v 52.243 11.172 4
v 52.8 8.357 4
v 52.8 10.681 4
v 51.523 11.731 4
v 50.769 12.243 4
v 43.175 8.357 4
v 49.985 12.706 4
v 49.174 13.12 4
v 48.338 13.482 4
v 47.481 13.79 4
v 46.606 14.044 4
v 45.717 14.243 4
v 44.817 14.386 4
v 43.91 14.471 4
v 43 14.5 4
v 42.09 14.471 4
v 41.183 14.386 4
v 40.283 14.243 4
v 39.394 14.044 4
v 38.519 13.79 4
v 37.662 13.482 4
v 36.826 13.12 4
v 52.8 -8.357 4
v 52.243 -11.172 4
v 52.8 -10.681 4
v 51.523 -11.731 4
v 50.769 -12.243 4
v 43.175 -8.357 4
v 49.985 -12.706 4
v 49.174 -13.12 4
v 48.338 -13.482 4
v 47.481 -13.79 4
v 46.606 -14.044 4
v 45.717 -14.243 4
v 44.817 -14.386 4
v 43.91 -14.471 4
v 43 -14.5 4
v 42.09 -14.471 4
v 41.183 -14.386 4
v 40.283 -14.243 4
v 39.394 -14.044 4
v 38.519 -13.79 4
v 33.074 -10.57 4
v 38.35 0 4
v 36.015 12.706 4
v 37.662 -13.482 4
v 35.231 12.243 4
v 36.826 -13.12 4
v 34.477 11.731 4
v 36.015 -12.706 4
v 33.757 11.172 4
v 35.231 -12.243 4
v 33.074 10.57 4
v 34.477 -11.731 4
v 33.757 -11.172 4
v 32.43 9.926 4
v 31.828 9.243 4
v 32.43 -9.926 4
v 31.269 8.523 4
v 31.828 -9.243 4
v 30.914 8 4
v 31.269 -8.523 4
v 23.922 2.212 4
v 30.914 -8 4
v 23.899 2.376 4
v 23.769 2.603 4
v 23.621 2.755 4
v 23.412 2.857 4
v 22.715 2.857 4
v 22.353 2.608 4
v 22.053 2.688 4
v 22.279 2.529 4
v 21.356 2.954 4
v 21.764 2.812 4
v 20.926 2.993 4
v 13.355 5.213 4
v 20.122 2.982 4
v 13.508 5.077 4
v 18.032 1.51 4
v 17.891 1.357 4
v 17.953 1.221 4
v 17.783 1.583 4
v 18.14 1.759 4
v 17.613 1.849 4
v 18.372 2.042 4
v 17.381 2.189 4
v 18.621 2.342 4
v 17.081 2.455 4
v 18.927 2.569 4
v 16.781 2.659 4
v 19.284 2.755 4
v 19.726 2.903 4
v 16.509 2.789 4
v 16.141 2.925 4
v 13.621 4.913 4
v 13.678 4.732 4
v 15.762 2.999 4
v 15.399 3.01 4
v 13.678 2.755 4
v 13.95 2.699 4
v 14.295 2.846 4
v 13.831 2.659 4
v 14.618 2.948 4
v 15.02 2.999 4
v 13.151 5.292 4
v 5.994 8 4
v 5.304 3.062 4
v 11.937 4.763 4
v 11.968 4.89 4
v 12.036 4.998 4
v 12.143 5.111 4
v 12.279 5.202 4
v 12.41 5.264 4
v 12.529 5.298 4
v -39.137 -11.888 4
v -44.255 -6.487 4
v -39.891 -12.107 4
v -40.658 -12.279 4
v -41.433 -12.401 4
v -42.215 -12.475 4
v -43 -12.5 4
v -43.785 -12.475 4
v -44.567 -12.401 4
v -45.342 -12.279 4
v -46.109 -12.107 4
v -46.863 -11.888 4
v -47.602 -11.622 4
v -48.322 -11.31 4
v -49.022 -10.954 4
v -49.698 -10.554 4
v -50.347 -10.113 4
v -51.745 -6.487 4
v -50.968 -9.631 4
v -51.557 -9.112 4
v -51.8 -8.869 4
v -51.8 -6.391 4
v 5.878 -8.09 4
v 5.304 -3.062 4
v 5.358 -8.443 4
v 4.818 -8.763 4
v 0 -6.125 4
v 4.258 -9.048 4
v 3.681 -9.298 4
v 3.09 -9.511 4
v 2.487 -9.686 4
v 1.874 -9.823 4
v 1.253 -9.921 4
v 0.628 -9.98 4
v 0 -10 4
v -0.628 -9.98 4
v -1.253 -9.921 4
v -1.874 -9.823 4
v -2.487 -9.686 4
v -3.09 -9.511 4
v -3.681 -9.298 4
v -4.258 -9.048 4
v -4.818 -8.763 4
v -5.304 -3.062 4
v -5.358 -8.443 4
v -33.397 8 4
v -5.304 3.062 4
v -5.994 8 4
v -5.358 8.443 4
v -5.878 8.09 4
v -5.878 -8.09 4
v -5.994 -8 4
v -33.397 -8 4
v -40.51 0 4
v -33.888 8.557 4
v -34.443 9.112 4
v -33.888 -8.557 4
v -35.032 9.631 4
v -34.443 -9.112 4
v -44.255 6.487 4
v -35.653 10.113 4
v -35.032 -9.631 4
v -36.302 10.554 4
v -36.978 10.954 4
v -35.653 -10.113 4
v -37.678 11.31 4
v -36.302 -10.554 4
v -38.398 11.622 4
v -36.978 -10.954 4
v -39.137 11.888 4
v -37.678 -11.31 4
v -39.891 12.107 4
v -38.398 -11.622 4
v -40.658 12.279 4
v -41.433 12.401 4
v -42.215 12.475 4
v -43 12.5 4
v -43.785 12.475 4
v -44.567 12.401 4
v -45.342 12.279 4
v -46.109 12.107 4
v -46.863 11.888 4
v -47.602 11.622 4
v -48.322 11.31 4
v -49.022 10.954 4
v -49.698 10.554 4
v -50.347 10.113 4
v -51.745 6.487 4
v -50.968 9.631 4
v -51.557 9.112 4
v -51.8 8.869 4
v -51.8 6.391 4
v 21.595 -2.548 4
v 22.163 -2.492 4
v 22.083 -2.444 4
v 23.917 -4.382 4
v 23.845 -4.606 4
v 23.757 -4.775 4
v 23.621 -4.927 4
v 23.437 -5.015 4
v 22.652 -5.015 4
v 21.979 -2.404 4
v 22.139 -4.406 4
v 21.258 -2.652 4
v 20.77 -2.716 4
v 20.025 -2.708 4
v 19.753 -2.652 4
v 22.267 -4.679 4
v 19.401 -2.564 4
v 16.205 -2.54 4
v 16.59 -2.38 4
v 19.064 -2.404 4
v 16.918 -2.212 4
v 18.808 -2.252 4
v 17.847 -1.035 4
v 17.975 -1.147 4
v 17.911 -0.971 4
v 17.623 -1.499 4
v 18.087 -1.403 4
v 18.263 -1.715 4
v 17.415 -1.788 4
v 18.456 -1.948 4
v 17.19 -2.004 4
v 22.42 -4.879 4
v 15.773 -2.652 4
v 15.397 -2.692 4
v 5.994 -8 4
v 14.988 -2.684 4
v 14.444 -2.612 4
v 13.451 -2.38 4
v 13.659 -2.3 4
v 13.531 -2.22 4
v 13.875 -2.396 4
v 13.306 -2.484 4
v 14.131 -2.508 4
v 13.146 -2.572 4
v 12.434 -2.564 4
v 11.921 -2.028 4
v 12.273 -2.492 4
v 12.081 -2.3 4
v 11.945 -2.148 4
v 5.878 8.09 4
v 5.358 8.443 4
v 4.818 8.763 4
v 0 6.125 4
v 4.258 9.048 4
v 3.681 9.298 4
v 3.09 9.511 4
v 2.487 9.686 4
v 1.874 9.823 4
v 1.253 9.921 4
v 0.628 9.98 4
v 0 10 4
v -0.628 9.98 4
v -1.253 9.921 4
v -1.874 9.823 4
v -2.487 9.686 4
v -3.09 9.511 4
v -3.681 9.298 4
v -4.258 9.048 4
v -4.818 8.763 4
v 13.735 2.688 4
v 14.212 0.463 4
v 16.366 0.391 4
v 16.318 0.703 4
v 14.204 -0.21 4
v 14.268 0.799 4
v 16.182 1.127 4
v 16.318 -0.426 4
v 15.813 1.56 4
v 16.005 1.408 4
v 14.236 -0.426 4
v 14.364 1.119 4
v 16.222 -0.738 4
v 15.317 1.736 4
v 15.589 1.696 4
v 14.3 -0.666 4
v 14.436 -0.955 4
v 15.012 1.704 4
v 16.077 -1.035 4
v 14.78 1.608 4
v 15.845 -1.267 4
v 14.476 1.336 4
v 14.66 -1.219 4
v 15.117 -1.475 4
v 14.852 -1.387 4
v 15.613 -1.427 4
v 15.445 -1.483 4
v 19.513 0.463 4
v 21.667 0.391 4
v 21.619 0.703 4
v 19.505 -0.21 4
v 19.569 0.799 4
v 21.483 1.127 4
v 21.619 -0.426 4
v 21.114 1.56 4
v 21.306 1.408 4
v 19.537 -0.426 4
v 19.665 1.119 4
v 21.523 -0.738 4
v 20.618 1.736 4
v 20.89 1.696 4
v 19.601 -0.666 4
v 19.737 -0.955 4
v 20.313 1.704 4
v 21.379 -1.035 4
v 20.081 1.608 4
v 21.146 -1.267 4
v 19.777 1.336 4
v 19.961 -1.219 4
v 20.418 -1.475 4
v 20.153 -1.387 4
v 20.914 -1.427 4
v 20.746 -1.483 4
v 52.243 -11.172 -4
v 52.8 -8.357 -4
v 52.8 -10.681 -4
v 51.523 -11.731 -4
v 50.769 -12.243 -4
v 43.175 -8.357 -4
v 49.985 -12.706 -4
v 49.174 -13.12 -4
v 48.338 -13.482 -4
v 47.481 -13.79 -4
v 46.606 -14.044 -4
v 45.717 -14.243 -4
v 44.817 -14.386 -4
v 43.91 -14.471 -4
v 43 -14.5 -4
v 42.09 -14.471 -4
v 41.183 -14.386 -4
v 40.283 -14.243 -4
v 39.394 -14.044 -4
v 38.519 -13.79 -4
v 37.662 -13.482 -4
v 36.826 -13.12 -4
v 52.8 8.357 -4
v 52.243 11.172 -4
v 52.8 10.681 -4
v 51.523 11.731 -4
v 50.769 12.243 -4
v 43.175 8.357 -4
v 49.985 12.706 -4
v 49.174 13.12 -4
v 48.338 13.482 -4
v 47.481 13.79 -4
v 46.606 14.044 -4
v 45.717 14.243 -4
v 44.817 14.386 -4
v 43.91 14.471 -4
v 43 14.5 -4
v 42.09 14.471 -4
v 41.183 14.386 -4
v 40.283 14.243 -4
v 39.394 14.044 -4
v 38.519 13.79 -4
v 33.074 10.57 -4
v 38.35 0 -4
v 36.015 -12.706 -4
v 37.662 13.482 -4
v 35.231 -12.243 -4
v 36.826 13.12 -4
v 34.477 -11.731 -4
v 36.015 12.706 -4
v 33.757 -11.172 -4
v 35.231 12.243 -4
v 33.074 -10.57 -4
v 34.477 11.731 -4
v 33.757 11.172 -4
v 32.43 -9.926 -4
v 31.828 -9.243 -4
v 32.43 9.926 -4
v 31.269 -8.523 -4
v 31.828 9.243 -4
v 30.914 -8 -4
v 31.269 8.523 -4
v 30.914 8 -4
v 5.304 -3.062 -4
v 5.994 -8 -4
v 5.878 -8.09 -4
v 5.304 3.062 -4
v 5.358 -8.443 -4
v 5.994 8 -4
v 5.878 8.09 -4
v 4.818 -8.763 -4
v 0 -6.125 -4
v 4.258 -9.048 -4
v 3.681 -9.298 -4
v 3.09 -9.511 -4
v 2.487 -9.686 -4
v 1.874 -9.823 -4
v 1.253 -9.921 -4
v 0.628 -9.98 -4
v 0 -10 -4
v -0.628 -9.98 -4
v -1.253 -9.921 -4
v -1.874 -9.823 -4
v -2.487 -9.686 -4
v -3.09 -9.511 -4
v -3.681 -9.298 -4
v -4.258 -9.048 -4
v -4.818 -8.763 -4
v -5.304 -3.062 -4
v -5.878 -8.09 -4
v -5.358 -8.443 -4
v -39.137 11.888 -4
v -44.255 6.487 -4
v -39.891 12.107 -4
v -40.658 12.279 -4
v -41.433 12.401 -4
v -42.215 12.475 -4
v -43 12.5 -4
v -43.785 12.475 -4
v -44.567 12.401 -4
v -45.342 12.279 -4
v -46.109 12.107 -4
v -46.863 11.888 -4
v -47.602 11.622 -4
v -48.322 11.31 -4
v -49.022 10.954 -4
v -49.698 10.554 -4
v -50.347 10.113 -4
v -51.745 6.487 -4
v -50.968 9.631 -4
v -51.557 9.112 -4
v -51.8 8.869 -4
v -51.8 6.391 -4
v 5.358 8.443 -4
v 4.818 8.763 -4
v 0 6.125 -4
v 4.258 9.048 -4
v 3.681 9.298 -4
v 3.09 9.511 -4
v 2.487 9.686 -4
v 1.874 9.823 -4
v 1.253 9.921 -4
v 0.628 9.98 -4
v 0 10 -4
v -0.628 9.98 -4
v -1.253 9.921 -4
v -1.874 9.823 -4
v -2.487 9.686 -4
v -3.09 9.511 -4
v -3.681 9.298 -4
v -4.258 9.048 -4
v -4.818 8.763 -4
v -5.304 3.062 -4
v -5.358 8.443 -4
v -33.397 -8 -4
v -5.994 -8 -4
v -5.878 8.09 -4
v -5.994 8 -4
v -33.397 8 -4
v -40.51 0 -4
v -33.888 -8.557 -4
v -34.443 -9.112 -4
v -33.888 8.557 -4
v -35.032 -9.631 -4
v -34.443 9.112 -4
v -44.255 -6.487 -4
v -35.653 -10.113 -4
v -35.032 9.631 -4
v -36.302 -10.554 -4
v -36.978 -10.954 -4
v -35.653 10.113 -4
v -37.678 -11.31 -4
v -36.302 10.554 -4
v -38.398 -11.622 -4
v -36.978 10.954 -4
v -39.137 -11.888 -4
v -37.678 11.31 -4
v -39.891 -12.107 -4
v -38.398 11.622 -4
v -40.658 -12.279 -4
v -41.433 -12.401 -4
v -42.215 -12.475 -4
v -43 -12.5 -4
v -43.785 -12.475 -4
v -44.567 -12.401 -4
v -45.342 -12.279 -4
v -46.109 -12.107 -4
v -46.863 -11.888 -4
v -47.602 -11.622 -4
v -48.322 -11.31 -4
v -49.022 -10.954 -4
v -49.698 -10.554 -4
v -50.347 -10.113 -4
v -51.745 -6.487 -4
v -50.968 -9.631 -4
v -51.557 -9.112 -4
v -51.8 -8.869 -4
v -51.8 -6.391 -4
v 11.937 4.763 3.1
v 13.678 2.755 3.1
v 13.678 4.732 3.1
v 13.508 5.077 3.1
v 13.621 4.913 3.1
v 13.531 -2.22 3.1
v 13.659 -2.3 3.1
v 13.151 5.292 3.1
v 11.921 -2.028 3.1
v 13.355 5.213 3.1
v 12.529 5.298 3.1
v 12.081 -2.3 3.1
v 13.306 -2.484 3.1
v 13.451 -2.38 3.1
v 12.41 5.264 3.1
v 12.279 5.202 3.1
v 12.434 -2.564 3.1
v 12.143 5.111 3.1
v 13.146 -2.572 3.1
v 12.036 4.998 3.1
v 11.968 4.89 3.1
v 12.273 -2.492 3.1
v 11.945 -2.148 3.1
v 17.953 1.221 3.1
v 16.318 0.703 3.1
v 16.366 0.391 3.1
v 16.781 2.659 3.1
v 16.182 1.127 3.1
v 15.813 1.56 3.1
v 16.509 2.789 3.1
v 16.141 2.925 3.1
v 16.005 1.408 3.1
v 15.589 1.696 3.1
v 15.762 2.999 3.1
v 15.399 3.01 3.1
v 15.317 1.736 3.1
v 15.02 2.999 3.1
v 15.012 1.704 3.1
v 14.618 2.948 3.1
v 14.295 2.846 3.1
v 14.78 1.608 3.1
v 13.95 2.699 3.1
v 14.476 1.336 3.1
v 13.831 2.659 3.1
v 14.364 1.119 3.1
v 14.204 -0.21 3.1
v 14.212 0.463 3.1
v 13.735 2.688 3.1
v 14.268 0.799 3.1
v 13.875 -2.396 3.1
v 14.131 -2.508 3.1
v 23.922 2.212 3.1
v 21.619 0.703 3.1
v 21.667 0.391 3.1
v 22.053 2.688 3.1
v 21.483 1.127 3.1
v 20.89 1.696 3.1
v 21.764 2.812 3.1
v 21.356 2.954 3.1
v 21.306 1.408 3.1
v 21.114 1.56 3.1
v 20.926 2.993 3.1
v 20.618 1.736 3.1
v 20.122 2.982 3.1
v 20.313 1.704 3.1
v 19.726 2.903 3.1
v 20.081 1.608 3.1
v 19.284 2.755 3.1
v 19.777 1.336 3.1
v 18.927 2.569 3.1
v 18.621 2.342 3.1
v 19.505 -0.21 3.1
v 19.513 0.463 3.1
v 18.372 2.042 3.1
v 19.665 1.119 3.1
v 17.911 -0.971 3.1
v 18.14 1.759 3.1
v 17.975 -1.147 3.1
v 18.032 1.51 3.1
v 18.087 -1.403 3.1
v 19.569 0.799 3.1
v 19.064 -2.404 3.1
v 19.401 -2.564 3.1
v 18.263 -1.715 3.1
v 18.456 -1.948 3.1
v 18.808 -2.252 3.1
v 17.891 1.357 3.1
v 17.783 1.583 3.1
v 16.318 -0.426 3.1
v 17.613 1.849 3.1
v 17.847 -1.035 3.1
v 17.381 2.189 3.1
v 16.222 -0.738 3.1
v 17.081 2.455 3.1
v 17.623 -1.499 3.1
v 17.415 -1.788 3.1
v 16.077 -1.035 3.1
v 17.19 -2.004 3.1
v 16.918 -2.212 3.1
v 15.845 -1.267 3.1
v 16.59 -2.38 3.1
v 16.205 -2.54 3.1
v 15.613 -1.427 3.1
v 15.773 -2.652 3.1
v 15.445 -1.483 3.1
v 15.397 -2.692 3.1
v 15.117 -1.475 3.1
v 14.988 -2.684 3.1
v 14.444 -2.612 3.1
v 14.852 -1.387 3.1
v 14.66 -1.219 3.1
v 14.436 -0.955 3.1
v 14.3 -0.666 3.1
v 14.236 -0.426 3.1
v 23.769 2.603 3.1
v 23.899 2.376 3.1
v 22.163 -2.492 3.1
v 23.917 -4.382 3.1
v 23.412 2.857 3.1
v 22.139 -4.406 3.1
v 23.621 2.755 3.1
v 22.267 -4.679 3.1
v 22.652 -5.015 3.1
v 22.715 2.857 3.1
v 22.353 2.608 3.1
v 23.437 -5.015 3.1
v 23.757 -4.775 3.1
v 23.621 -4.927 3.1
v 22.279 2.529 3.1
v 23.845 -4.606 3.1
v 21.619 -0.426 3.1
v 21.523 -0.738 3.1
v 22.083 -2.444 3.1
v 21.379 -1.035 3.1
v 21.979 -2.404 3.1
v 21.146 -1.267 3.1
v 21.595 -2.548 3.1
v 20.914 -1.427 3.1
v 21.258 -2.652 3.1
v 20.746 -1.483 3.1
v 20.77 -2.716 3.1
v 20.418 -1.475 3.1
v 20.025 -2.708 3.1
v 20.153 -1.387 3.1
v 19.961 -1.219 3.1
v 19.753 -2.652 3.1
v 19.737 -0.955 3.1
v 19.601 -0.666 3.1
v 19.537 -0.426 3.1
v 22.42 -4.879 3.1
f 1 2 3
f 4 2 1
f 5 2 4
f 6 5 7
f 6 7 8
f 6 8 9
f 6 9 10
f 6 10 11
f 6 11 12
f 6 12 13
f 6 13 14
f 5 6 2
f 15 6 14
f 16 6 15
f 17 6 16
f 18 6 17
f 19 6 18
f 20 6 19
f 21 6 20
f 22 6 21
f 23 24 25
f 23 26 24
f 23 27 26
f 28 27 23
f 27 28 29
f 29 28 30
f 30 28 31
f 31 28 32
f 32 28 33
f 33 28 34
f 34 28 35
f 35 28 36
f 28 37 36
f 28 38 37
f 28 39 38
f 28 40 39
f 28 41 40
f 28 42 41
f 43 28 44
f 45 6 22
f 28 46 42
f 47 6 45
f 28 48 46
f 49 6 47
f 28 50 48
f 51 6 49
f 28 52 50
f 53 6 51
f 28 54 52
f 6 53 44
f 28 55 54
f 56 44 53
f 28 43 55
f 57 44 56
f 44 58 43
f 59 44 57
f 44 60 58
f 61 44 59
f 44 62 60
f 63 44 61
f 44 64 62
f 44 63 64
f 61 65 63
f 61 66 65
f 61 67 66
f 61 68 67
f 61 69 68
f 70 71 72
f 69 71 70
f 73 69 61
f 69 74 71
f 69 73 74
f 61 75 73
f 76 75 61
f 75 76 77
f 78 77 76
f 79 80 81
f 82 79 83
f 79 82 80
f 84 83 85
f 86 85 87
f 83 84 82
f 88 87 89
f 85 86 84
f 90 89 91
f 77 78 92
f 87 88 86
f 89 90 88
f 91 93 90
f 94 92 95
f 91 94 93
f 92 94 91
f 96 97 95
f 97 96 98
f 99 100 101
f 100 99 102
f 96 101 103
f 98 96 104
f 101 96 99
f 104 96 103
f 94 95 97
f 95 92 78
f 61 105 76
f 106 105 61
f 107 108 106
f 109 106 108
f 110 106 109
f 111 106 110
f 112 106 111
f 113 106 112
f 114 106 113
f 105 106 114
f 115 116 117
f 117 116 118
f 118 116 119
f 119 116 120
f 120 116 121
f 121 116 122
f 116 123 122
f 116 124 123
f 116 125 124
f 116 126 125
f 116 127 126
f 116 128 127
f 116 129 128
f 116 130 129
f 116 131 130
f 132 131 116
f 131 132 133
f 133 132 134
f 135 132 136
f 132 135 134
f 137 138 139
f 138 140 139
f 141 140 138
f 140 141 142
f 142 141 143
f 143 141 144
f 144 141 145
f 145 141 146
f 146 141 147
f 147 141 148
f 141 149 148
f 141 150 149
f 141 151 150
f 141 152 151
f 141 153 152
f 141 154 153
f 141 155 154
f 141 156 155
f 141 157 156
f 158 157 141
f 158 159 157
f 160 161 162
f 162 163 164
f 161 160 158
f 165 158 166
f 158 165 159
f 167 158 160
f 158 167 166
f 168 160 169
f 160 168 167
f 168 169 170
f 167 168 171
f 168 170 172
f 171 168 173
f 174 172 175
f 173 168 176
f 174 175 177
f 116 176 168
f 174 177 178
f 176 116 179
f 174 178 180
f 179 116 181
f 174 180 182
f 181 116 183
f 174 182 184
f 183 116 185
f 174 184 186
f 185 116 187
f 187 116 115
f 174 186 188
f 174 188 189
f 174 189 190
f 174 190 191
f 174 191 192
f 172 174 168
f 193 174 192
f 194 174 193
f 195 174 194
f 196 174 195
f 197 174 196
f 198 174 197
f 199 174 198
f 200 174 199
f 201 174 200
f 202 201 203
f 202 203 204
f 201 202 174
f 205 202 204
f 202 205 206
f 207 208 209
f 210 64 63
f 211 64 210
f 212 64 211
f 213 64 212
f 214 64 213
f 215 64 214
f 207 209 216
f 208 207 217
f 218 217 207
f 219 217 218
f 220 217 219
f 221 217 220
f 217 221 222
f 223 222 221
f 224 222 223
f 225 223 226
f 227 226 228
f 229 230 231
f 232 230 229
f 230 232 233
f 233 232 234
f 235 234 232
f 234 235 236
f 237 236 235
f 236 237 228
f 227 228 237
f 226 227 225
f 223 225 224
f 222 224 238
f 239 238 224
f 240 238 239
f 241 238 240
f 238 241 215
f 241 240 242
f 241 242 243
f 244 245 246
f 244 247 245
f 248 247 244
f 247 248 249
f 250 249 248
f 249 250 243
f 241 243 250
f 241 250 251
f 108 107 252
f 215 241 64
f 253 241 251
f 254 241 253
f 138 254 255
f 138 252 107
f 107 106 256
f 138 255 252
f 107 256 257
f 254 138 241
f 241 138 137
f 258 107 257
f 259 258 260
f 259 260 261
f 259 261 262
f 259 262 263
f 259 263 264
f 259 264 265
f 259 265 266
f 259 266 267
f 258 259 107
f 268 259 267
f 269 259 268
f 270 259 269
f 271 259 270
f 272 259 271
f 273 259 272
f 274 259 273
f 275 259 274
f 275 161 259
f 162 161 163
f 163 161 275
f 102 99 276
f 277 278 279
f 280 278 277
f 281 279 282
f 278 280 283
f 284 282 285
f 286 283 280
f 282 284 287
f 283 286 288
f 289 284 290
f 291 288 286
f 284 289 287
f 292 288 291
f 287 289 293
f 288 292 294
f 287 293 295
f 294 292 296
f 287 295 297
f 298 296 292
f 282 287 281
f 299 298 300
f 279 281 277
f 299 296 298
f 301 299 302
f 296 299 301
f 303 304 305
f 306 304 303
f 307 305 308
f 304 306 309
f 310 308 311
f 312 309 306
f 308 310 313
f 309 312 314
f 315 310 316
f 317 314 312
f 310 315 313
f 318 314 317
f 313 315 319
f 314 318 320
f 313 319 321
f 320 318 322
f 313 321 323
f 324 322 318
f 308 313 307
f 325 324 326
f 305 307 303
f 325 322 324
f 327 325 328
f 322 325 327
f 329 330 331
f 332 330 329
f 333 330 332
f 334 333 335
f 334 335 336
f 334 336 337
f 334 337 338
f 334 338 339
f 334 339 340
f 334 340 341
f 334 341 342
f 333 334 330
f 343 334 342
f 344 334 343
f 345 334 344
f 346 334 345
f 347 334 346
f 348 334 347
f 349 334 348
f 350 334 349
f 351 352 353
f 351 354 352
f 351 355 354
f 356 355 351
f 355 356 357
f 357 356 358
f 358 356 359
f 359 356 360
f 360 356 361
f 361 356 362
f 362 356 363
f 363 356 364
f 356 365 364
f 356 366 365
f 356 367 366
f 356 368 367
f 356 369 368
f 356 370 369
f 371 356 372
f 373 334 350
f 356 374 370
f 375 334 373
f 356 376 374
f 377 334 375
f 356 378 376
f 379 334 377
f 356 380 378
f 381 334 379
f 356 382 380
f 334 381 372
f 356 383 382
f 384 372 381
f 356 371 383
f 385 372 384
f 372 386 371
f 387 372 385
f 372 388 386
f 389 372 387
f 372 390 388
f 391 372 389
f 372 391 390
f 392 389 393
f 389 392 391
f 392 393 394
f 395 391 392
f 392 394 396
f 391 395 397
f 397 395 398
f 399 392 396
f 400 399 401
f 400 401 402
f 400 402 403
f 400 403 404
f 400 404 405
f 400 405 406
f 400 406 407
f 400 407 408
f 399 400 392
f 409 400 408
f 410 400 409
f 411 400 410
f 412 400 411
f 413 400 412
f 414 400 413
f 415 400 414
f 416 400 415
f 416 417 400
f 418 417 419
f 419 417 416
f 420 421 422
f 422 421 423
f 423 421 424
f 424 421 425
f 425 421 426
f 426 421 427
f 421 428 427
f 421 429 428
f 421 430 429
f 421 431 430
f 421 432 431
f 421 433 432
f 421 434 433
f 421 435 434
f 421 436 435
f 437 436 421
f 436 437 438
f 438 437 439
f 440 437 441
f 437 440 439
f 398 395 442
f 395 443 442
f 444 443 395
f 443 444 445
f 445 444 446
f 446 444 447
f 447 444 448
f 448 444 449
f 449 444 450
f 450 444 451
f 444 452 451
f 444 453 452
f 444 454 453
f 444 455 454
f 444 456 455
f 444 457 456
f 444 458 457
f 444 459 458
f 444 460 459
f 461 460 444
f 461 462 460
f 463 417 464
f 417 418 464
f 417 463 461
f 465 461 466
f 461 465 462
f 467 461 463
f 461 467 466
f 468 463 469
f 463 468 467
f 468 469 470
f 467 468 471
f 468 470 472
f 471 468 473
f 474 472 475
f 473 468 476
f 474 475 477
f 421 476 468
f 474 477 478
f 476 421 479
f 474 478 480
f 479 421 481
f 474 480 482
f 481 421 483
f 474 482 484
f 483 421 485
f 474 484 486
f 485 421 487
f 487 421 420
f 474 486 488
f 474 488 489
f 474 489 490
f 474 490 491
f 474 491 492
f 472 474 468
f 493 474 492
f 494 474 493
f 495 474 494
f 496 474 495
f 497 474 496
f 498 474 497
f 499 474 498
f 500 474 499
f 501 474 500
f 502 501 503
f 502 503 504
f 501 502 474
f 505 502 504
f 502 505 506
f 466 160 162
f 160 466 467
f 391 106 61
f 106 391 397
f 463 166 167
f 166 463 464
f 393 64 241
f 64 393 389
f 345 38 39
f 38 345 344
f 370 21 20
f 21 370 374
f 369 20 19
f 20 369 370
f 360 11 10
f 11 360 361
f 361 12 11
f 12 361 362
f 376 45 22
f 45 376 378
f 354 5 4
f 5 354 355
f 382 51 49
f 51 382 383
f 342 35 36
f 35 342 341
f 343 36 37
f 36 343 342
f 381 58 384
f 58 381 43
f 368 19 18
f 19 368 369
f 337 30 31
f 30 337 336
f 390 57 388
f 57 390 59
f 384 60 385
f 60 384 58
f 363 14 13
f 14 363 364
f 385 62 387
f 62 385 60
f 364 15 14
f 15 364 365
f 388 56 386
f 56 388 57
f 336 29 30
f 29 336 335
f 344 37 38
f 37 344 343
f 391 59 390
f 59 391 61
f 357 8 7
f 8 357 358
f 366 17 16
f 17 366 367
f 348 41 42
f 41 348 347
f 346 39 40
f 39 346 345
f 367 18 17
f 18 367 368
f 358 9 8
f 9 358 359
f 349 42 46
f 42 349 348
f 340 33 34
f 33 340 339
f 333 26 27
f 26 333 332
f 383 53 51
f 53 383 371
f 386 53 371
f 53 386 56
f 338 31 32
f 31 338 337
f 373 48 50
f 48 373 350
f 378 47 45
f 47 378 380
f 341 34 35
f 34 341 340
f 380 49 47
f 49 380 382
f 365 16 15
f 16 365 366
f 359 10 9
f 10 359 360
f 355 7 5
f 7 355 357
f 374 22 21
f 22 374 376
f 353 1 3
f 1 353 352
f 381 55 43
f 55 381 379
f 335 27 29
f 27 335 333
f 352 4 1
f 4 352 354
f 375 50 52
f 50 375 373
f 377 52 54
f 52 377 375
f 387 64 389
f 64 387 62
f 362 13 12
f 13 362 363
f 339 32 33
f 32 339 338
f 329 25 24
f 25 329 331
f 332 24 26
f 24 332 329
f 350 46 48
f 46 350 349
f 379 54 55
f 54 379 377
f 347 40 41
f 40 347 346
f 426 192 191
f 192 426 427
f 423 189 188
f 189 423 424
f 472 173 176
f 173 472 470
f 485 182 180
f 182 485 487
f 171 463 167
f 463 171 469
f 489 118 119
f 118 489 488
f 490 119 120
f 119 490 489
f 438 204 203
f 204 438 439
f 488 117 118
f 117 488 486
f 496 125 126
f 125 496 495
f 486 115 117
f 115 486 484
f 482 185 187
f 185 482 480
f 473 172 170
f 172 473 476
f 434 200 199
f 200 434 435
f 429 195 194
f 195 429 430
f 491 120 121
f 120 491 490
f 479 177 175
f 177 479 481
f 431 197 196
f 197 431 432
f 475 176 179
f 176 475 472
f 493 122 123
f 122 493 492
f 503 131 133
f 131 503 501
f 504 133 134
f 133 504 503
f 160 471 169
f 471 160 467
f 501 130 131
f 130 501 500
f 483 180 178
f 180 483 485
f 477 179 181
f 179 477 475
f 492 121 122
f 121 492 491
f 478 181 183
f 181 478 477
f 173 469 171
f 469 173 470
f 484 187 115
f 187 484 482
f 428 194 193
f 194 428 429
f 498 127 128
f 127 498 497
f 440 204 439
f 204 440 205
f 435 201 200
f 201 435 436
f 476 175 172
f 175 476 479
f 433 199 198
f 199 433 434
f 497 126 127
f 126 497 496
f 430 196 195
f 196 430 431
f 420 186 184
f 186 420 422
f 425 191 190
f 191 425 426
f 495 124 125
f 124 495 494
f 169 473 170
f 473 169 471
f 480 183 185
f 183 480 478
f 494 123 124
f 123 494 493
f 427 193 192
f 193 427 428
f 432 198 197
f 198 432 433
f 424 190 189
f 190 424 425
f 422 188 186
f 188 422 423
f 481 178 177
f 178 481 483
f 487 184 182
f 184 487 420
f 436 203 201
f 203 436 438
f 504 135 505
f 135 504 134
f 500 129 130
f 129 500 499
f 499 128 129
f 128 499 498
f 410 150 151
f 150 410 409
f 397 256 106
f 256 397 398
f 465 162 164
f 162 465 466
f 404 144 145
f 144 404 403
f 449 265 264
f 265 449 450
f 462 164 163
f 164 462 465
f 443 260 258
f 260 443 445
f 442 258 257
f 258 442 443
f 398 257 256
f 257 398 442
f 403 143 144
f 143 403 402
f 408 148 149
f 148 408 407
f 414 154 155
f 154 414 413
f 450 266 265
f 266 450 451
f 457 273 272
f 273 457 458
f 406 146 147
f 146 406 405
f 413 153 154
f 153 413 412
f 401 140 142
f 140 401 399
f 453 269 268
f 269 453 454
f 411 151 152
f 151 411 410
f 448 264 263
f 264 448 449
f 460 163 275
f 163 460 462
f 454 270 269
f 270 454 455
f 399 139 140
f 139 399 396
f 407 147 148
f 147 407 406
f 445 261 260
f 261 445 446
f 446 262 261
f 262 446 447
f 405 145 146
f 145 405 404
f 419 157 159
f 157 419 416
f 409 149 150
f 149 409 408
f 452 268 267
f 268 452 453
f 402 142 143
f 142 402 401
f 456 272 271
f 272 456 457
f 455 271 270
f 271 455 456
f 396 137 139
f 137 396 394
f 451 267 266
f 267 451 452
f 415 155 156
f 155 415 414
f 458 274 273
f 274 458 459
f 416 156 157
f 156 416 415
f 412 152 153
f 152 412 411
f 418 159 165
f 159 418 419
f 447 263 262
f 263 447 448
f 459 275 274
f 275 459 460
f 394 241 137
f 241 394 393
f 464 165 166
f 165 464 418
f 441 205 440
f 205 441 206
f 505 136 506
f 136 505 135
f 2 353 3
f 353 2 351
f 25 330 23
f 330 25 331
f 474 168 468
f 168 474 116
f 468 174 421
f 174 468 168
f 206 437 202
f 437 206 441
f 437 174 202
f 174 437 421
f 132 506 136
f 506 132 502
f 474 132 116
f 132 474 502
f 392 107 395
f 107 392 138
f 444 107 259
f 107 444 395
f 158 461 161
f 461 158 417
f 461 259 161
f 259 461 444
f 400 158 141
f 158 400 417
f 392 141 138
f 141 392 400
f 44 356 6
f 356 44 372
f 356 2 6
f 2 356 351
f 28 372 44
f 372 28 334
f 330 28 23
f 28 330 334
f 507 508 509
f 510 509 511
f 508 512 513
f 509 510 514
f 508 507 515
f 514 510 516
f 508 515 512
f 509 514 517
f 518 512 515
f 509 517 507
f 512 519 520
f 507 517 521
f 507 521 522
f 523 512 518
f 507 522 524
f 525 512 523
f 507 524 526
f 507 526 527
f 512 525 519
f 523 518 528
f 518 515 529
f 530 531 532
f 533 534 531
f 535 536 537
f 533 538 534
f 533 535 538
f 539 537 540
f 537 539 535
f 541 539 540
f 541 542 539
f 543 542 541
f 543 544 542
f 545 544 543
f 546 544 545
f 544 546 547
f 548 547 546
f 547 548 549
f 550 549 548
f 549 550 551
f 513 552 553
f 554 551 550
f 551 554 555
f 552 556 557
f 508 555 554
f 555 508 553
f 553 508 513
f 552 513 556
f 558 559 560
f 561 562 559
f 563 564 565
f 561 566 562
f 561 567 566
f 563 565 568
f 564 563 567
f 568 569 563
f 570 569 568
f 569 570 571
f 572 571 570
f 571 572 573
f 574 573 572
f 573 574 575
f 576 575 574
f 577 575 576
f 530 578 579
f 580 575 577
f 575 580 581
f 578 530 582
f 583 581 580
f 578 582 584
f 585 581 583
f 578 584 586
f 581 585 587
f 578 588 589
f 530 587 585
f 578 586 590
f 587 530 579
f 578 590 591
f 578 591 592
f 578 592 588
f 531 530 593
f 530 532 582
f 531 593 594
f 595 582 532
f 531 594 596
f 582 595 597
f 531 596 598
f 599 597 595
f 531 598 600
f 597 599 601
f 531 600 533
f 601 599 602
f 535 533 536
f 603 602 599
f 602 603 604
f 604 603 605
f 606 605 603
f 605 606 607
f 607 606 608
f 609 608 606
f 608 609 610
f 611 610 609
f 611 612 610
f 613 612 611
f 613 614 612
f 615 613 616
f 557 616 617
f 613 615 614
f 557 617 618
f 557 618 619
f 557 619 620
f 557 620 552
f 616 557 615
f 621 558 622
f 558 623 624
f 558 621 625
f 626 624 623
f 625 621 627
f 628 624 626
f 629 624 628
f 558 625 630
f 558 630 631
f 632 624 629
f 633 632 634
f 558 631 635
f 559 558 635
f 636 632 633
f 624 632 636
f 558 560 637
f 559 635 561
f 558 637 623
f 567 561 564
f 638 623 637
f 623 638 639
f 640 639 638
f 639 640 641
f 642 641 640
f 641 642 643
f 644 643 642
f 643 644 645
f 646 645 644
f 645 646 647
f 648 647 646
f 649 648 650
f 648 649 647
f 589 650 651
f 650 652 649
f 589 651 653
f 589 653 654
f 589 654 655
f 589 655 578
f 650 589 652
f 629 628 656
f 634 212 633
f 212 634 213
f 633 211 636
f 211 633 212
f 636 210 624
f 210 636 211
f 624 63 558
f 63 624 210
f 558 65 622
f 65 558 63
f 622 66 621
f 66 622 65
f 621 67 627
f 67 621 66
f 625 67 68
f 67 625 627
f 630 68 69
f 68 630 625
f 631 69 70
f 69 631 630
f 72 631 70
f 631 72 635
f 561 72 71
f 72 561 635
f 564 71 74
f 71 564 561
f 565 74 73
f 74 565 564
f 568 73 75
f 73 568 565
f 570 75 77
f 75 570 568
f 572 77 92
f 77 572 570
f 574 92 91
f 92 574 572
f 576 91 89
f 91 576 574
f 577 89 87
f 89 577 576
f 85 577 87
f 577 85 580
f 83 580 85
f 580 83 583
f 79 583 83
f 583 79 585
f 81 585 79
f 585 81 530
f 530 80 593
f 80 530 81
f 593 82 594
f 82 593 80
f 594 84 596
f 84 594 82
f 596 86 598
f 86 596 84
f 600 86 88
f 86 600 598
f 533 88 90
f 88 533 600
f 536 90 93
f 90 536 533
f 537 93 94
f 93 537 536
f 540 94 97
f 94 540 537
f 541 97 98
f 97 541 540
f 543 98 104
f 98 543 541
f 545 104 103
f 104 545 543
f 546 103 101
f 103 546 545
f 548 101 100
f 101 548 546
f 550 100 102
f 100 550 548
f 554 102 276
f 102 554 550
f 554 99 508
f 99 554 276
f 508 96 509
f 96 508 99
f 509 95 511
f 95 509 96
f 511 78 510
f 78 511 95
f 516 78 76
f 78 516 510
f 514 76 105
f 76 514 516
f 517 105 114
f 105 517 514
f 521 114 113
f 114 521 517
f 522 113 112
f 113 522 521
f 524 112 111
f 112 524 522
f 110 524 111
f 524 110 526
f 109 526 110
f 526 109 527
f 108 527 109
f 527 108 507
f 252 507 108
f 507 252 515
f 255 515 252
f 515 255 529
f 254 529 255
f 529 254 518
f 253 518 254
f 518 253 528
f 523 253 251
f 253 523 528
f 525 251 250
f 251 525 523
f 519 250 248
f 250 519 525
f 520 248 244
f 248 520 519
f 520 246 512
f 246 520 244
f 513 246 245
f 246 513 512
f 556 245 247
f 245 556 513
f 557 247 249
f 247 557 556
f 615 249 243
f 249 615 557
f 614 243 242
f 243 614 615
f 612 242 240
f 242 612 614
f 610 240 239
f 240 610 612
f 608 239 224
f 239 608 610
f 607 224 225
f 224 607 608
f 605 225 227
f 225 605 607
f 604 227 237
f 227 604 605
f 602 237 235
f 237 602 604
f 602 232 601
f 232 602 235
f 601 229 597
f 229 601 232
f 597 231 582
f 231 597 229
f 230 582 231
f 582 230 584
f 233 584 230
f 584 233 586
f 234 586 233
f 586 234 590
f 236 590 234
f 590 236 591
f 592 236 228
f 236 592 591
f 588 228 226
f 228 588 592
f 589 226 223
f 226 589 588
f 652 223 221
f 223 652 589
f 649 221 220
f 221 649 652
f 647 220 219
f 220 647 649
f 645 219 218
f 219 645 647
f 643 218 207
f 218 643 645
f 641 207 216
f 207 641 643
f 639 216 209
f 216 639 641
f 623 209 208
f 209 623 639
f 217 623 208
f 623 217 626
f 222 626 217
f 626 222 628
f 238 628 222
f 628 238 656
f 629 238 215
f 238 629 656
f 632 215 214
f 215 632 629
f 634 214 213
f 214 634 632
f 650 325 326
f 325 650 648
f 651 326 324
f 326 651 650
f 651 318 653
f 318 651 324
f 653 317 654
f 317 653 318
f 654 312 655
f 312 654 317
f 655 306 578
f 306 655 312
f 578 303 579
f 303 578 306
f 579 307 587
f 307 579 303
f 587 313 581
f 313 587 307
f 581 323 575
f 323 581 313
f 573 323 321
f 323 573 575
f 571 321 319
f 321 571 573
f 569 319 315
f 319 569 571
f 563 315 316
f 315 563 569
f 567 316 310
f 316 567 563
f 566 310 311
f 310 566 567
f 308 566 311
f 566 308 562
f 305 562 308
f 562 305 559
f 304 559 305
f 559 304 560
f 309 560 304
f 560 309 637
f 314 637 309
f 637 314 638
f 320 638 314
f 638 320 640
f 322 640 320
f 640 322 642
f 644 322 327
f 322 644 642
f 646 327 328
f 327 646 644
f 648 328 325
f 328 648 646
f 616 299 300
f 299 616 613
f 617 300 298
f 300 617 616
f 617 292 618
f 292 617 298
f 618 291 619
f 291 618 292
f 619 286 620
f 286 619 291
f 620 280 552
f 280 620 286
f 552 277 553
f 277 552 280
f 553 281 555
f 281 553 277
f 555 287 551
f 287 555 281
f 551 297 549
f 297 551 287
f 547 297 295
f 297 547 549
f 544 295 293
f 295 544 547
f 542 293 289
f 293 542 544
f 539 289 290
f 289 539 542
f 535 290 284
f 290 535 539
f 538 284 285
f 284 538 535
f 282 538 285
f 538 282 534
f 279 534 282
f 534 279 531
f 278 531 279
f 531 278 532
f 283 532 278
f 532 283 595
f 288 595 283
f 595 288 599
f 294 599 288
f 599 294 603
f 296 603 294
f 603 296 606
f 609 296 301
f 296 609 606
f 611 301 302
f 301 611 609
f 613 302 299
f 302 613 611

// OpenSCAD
//---------------------------------------------------------------
//--  Llave fija impresa 10 (M6) - 13 (M8) - 17 (M10) .  (c) Pedro de Oro Martín
//---------------------------------------------------------------
//-- Released under the GPL license
//---------------------------------------------------------------


X = 0;
Y = 1;
Z = 2;


//-- Size of the logo in the dxf file
size_ini = [106.8, 91.8];

//-- Original width of the b and q lines
width = 15;

module bq_logo(lx = 12, h = 2)
{
  s = lx / size_ini[X];

  linear_extrude(height=h)
    scale([s, s, 1])
    import("bq-logo2d.dxf", layer="lines");


}


// Diametros tuercas metricas ISO 4032

DTM6 = 11.05;
DTM8 = 14.38;
DTM10 = 18.90;


// Incremento revolucionario
INCREMENTO = 0.4;

valorZ=8;

//--Lave fija

difference(){
	union(){
		difference() {
		
		union(){  
			cube([80,16,valorZ], center=true);
			
			translate([43,0,0])
			cylinder(r=14.5, h=valorZ, center=true, $fn=100);
			
			translate([-43,0,0])
			cylinder(r=12.5, h=valorZ, center=true, $fn=100);
			
			cylinder(r=10, h=valorZ, center=true, $fn=100);
			
		}
		
		 translate([-61.8,0,0.5])
		 cube([20,40,valorZ+1], center=true);
		
		 translate([62.8,0,0.5])
		 cube([20,40,valorZ+1], center=true);
		
		 // Tuerca M8
		 translate([-48,0,0.5])
		 rotate([0,0,60])
		 cylinder(h=valorZ+1, r=(DTM8*0.5)+INCREMENTO-0.1, $fn=6 , center=true);
		
		 // Tuerca M6
		 translate([0,0,0.5])
		 rotate([0,0,90])
		 cylinder(h=valorZ+1, r=(DTM6*0.5)+INCREMENTO+0.2, $fn=6 , center=true);
		
		 // Tuerca M10
		 translate([48,0,0.5])
		 rotate([0,0,60])
		 cylinder(h=valorZ+1, r=(DTM10*0.5)+INCREMENTO-0.2, $fn=6 , center=true);


	}
}

translate([18,0,3.1])
bq_logo();

}
  
